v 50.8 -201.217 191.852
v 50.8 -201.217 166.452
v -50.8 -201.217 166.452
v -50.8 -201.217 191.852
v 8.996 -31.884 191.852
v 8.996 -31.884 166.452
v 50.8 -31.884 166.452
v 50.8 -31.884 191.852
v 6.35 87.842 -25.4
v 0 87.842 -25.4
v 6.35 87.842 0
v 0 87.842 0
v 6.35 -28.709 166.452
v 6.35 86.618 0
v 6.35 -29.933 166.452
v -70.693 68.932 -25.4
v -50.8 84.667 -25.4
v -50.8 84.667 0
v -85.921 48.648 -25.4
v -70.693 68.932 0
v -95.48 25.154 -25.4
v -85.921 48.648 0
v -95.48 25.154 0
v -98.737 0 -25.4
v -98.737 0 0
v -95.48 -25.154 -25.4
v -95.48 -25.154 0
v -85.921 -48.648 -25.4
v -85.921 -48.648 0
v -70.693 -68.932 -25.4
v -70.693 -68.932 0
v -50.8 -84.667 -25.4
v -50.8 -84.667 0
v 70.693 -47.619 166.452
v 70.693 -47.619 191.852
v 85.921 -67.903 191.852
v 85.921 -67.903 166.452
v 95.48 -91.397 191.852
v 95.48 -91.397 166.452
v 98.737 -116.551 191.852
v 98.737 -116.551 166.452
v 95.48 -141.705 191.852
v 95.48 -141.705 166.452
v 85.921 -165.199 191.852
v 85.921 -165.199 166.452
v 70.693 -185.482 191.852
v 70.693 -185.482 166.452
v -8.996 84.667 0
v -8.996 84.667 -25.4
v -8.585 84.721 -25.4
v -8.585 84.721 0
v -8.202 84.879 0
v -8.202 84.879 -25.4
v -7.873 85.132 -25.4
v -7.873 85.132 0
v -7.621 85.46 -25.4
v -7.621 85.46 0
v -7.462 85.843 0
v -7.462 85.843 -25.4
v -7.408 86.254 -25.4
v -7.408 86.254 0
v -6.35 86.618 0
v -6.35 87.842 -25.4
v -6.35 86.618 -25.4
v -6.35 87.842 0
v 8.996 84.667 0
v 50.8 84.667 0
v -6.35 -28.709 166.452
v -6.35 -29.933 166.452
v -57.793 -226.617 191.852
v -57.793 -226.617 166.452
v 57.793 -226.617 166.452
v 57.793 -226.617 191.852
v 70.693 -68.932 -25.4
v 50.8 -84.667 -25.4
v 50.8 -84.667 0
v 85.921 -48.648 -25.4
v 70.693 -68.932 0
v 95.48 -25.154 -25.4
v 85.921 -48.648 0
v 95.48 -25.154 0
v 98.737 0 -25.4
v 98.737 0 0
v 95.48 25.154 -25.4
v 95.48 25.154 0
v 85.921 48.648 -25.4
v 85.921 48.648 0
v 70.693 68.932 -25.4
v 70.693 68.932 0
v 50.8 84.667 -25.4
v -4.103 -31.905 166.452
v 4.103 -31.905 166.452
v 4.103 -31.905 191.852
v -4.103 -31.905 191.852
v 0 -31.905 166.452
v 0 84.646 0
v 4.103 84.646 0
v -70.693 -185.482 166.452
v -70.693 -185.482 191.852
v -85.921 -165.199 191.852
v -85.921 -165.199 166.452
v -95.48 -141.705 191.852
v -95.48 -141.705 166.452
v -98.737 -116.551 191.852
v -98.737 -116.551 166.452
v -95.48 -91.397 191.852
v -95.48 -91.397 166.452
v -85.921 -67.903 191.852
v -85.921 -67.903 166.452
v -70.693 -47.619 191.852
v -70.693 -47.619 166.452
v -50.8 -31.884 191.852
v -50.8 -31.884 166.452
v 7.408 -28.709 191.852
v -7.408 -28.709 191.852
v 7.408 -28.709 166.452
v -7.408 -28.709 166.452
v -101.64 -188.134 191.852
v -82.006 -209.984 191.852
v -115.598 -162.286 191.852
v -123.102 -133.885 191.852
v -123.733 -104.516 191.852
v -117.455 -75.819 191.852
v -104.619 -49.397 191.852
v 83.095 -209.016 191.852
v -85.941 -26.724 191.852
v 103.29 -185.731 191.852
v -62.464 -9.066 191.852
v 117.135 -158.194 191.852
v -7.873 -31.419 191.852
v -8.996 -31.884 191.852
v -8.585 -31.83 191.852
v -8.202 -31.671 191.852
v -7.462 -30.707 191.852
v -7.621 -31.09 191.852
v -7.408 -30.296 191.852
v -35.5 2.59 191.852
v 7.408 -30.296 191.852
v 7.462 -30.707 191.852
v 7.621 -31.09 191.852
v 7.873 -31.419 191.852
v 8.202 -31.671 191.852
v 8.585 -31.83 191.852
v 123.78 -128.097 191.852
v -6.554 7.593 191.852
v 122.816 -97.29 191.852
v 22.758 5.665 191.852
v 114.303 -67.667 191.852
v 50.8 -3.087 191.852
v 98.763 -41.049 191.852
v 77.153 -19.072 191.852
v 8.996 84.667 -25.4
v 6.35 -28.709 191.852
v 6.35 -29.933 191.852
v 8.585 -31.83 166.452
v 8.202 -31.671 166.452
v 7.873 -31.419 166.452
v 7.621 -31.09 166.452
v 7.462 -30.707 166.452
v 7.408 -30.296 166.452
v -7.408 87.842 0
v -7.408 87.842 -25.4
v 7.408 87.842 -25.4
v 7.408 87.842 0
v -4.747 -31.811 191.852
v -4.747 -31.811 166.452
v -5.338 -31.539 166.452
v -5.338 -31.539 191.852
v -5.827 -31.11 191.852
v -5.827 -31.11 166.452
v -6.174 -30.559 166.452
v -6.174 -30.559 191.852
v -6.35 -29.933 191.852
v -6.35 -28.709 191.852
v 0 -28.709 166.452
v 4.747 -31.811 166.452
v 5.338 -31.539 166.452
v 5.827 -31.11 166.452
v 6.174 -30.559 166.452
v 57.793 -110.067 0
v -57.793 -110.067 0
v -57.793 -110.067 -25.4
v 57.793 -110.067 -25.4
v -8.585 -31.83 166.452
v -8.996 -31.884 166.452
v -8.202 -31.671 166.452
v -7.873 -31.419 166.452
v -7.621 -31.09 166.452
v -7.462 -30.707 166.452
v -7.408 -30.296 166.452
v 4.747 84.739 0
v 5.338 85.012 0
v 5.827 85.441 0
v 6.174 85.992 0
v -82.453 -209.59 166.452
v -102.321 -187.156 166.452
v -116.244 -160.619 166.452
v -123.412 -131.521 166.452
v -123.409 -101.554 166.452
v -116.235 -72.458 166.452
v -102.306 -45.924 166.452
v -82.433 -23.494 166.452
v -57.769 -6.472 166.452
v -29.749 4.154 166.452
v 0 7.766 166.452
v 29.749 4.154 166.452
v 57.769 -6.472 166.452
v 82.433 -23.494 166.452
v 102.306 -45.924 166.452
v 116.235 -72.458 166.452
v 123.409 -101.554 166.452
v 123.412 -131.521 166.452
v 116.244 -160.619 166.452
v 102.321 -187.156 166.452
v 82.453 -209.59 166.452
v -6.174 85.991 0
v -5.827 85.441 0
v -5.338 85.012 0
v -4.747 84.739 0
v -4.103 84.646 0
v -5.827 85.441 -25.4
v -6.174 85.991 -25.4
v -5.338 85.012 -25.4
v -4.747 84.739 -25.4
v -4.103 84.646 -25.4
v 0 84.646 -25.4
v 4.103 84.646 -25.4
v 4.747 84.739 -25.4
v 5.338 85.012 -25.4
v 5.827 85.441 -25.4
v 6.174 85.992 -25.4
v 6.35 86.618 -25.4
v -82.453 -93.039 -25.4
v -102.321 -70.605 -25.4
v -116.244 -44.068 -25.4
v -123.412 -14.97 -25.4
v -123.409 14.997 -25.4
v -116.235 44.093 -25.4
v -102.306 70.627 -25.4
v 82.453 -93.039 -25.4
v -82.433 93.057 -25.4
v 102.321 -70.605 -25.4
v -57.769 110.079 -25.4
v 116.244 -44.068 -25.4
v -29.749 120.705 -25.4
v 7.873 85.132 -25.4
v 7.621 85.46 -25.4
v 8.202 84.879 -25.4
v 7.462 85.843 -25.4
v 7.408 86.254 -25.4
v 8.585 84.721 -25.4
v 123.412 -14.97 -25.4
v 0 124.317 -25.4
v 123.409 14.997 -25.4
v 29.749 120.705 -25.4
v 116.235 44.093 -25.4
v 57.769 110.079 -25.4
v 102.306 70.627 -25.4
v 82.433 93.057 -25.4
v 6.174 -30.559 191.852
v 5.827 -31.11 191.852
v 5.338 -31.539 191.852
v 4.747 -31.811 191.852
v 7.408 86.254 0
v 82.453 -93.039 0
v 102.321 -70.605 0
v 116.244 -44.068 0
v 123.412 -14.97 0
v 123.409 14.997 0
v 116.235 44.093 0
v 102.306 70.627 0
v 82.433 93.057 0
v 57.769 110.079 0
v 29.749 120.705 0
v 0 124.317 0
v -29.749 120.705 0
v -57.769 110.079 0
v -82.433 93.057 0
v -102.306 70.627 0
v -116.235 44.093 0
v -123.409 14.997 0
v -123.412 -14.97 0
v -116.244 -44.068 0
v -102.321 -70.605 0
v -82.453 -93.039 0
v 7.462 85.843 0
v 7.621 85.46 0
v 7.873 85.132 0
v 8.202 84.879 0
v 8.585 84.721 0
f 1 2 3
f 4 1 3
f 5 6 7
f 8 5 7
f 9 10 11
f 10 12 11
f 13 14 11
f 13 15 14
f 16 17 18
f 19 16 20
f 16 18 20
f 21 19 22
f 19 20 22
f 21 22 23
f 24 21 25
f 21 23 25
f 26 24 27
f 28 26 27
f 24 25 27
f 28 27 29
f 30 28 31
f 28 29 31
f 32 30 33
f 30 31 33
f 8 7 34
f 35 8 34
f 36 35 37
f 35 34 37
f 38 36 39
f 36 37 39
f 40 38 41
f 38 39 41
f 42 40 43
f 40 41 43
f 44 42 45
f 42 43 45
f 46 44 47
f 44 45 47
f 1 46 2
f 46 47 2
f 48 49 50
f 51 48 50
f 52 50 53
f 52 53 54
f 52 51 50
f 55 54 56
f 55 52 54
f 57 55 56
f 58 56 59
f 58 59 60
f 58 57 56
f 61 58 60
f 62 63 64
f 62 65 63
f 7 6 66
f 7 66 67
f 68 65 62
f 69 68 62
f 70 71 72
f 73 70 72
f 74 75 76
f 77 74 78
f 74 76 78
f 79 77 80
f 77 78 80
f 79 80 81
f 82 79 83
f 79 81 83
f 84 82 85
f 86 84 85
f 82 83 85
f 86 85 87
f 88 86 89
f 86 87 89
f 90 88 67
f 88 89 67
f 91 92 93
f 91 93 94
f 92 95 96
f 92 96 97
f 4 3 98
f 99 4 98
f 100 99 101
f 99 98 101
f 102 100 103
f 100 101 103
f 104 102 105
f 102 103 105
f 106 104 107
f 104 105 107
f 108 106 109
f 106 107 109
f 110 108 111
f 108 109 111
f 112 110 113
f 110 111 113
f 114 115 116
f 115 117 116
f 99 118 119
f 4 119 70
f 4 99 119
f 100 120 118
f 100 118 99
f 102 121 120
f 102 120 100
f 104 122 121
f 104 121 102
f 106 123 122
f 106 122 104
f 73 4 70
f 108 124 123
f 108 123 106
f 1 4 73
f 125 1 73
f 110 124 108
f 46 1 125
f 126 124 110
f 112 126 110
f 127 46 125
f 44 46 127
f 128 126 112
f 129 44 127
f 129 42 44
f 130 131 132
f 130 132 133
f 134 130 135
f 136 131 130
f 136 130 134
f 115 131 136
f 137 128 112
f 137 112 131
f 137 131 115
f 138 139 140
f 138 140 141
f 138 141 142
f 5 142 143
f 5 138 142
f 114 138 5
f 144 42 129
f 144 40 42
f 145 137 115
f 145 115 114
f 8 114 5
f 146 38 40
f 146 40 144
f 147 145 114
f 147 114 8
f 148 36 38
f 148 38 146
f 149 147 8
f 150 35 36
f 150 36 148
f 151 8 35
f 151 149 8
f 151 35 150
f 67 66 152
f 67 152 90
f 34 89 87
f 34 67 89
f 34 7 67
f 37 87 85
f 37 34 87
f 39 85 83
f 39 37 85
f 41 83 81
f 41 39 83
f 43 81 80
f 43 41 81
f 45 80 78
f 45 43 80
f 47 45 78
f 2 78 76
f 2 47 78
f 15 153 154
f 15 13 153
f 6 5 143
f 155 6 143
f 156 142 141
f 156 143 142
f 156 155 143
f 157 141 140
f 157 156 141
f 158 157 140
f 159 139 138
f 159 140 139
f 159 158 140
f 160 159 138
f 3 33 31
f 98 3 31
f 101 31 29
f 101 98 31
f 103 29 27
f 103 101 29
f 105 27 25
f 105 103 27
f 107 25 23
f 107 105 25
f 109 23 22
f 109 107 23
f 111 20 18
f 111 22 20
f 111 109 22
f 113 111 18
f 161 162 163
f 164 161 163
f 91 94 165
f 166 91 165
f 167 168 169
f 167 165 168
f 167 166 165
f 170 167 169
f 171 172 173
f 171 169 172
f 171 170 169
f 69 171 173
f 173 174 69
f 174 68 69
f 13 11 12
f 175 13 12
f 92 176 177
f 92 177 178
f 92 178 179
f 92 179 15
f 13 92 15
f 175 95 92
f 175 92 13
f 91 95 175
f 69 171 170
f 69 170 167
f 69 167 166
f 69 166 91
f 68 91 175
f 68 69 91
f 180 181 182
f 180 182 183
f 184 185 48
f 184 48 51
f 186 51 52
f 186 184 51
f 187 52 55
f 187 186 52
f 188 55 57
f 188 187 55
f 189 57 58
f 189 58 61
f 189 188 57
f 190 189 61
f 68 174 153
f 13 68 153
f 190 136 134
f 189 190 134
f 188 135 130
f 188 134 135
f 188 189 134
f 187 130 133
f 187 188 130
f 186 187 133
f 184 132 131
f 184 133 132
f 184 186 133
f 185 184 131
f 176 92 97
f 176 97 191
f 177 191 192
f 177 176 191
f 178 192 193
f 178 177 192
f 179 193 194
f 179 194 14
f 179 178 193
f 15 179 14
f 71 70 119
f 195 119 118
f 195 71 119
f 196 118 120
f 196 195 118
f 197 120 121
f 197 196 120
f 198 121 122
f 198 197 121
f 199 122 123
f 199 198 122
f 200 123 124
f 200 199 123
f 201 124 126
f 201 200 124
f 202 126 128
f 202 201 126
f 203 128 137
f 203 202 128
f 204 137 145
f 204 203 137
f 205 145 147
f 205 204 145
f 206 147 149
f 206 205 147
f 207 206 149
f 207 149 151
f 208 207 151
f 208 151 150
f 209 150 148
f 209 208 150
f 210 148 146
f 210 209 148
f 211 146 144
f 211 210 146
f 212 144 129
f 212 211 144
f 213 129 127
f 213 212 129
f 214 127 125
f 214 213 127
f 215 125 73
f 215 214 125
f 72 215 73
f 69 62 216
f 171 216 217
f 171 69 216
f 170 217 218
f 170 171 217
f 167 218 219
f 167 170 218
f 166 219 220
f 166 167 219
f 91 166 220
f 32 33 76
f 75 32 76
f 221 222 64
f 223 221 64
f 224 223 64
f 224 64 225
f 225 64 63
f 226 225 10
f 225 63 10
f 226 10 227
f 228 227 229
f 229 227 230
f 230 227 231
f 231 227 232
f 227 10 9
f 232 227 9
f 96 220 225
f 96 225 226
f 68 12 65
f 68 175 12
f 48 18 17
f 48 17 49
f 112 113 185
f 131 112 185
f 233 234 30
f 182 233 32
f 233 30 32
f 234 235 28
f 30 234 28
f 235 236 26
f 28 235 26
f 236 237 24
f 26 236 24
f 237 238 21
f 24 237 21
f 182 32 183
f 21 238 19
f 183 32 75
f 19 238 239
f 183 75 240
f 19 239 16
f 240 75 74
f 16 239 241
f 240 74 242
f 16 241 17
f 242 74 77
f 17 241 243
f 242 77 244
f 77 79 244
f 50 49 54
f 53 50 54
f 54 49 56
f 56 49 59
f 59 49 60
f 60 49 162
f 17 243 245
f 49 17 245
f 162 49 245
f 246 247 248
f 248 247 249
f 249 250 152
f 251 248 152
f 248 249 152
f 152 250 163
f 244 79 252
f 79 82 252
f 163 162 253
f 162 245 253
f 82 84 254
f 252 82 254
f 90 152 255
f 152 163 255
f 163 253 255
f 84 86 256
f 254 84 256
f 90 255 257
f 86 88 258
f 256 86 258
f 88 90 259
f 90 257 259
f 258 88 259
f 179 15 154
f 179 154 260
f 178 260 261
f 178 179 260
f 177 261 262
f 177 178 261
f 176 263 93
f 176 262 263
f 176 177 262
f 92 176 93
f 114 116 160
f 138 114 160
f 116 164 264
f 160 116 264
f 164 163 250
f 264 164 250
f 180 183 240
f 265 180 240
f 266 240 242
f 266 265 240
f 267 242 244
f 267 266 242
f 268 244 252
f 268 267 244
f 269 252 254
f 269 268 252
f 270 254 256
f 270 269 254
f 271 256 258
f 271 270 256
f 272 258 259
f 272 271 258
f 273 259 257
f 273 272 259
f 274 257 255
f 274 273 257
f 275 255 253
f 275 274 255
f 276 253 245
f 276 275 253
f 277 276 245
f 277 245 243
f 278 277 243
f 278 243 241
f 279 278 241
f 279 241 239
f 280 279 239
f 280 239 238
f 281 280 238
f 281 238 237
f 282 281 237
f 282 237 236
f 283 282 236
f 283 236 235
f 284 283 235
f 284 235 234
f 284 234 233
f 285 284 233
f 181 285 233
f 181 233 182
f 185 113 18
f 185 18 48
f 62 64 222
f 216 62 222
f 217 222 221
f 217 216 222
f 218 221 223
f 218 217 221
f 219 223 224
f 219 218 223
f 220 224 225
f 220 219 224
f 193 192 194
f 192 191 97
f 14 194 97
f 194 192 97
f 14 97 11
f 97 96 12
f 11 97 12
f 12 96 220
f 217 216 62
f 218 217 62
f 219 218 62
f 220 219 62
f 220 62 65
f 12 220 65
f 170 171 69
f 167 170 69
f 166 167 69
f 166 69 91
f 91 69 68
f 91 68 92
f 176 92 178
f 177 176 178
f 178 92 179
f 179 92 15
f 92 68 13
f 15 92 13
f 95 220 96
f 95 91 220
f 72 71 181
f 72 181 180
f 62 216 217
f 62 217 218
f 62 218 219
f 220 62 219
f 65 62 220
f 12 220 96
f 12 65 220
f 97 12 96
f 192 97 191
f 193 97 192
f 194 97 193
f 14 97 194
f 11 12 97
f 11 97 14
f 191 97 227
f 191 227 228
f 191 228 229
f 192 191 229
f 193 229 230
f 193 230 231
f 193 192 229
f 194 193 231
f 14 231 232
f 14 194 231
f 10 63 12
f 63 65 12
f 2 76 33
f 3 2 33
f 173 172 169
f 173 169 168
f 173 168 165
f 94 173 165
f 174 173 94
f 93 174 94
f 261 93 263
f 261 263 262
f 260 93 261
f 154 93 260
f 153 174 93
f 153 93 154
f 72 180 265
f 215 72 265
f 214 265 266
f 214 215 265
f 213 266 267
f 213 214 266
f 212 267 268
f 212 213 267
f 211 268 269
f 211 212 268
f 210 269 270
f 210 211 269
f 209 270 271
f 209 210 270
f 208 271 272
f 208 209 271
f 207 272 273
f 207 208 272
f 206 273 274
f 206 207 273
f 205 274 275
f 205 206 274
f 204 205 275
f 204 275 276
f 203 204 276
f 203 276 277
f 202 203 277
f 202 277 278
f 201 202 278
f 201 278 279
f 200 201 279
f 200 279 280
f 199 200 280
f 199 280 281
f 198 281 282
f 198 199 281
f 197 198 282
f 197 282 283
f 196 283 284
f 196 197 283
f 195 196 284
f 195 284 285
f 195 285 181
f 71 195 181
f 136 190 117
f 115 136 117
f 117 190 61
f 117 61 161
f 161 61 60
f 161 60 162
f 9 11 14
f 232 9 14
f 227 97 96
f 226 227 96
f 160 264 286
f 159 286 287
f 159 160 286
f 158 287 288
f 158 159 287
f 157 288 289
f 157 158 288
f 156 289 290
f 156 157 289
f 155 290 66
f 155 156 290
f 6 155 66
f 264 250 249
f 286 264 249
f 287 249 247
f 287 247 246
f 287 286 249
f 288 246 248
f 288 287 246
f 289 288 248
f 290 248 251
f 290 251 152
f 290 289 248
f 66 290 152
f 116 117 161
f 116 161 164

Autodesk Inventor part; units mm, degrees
ref_plane "YZ Plane" through (0, 0, 0) normal (1, 0, 0) x (0, 1, 0)
ref_plane "XZ Plane" through (0, 0, 0) normal (0, 1, 0) x (-1, 0, 0)
sketch "Sketch1" plane through (0, 0, 0) normal (0, 0, 1) x (1, 0, 0)
  line L0 (-50.8, -84.6667) -> (50.8, -84.6667)
  arc A0 (57.793, -110.0667) -> (-57.793, -110.0667) centre (0, 0) ccw
  arc A1 (-50.8, 84.6667) -> (-50.8, -84.6667) centre (0, 0) ccw
  arc A2 (50.8, -84.6667) -> (50.8, 84.6667) centre (0, 0) ccw
  line L1 (-57.793, -110.0667) -> (57.793, -110.0667)
  line L2 (0, 84.6667) -> (0, 87.8417) construction
  line L3 (-7.4083, 87.8417) -> (7.4083, 87.8417)
  line L4 (-7.4083, 87.8417) -> (-7.4083, 86.2542)
  line L5 (7.4083, 87.8417) -> (7.4083, 86.2542)
  line L6 (0, 84.6667) -> (8.9958, 84.6667) construction
  arc A3 (7.4083, 86.2542) -> (8.9958, 84.6667) centre (8.9958, 86.2542) ccw
  arc A4 (-8.9958, 84.6667) -> (-7.4083, 86.2542) centre (-8.9958, 86.2542) ccw
  line L7 (-50.8, 84.6667) -> (-8.9958, 84.6667)
  line L8 (8.9958, 84.6667) -> (50.8, 84.6667)
  line L9 (0, 84.6667) -> (-8.9958, 84.6667) construction
  line L10 (-6.35, 87.8417) -> (0, 87.8417)
  line L11 (7.4083, 87.8417) -> (-7.4083, 87.8417)
  line L12 (-6.35, 87.8417) -> (-6.35, 86.6178)
  line L13 (-4.1034, 84.646) -> (0, 84.646)
  line L14 (0, 84.646) -> (0, 87.8417) construction
  line L15 (-6.3485, 84.6667) -> (-3.1743, 87.8409) construction
  arc A5 (-3.1736, 84.646) -> (-6.35, 87.8417) centre (-6.3485, 84.6667) ccw construction
  arc A6 (-6.35, 86.6178) -> (-4.1034, 84.646) centre (-4.1034, 86.9117) ccw
  line L16 (6.35, 87.8417) -> (0, 87.8417)
  line L17 (6.35, 87.8417) -> (6.35, 86.6178)
  line L18 (4.1034, 84.646) -> (0, 84.646)
  line L19 (6.3485, 84.6667) -> (3.1743, 87.8409) construction
  arc A7 (6.35, 87.8417) -> (3.1736, 84.646) centre (6.3485, 84.6667) ccw construction
  arc A8 (4.1034, 84.646) -> (6.35, 86.6178) centre (4.1034, 86.9117) ccw
  line L20 (6.35, 87.8417) -> (-6.35, 87.8417)
  dimension "d1" = 101.6
  dimension "d2" = 25.4
  dimension "d34" = 14.8167
  dimension "d35" = 1.5875
  dimension "d36" = 1.5875
  dimension "d38" = 6.35
  dimension "d39" = 3.175
  dimension "d40" = 45
  dimension "d41" = 2.2657
  dimension "d42" = 2.2466
extrude "connection top" add sketch "Sketch1" against normal blind 25.4
extrude "light flat top" add sketch "Sketch1" against normal up to surface (25.4 mm away) separate body contours L3 L17 A8 L18 L13 A6 L12
ref_plane "Work Plane2" through (0, 0, 203.2) normal (0, 0, 1) x (1, 0, 0)
sketch "Sketch6" plane through (0, 0, 0) normal (1, 0, 0) x (0, 1, 0)
  line L0 (-110.0667, 0) -> (124.3169, 0) projected
  line L1 (-83.4784, 0) -> (-200.0291, 166.4517)
  point P0 (0, 0)
  dimension "d28" = 203.2
  dimension "d29" = 55
sweep "ramp" add profiles "Sketch1" path "Sketch6" bodies 1 path curves L1
sweep "light angle" add profiles "Sketch1" path "Sketch6" separate body path curves L1 contours L3 L17 A8 L18 L13 A6 L12
sketch "Sketch8" plane through (0, -116.5507, 166.4517) normal (0, 0, 1) x (1, 0, 0)
  arc A0 (-50.8, 84.6667) -> (-50.8, -84.6667) centre (0, 0) ccw projected
  line L0 (-50.8, 84.6667) -> (-8.9958, 84.6667) projected
  line L1 (-50.8, 84.6667) -> (-8.9958, 84.6667)
  arc A1 (-8.9958, 84.6667) -> (-7.4083, 86.2542) centre (-8.9958, 86.2542) ccw projected
  line L2 (-7.4083, 87.8417) -> (7.4083, 87.8417) projected
  line L3 (-7.4083, 86.2542) -> (-7.4083, 87.8417)
  line L4 (7.4083, 87.8417) -> (7.4083, 86.2542) projected
  line L5 (-7.4083, 87.8417) -> (7.4083, 87.8417)
  line L6 (7.4083, 87.8417) -> (7.4083, 86.2542)
  arc A2 (7.4083, 86.2542) -> (8.9958, 84.6667) centre (8.9958, 86.2542) ccw projected
  line L7 (50.8, 201.2174) -> (50.8, 84.6667) projected
  line L8 (8.9958, 84.6667) -> (50.8, 84.6667)
  arc A3 (50.8, -84.6667) -> (50.8, 84.6667) centre (0, 0) ccw projected
  line L9 (50.8, -84.6667) -> (-50.8, -84.6667) projected
  line L10 (-50.8, -84.6667) -> (50.8, -84.6667)
  arc A4 (-8.9958, 84.6667) -> (-7.4083, 86.2542) centre (-8.9958, 86.2542) ccw
  arc A5 (7.4083, 86.2542) -> (8.9958, 84.6667) centre (8.9958, 86.2542) ccw
  arc A6 (-50.8, 84.6667) -> (-50.8, -84.6667) centre (0, 0) ccw
  arc A7 (50.8, -84.6667) -> (50.8, 84.6667) centre (0, 0) ccw
  arc A8 (57.793, -110.0667) -> (-57.793, -110.0667) centre (0, 0) ccw projected
  arc A9 (57.793, -110.0667) -> (-57.793, -110.0667) centre (0, 0) ccw
  line L11 (-57.793, -110.0667) -> (57.793, -110.0667) projected
  line L12 (-57.793, -110.0667) -> (57.793, -110.0667)
  point P0 (0, 116.5507)
extrude "connection bottom" add sketch "Sketch8" along normal blind 25.4 bodies 1
sketch "Sketch9" plane through (-6.35, -28.7091, 166.4517) normal (0, 0, 1) x (1, 0, 0)
  line L0 (0, 0) -> (0, -1.2238) projected
  line L1 (0, 0) -> (12.7, 0)
  line L2 (12.7, 115.3269) -> (12.7, -1.2238) projected
  arc A0 (10.4534, -3.1956) -> (12.7, -1.2238) centre (10.4534, -0.9299) ccw projected
  line L3 (12.7, -1.2238) -> (12.7, 0)
  arc A1 (0, -1.2238) -> (2.2466, -3.1956) centre (2.2466, -0.9299) ccw projected
  line L4 (10.4534, -3.1956) -> (2.2466, -3.1956)
  line L5 (0, -1.2238) -> (0, 0)
  line L6 (2.2466, -3.1956) -> (10.4534, -3.1956) projected
  arc A2 (0, -1.2238) -> (2.2466, -3.1956) centre (2.2466, -0.9299) ccw
  arc A3 (10.4534, -3.1956) -> (12.7, -1.2238) centre (10.4534, -0.9299) ccw
  point P0 (6.35, 28.7091)
extrude "light flat bottom" add sketch "Sketch9" along normal blind 25.4 separate body
equation "\"d35\" = 0.5 * d37"
equation "\"d37\" = 3.175"
properties part number "ramp connect both ends"
